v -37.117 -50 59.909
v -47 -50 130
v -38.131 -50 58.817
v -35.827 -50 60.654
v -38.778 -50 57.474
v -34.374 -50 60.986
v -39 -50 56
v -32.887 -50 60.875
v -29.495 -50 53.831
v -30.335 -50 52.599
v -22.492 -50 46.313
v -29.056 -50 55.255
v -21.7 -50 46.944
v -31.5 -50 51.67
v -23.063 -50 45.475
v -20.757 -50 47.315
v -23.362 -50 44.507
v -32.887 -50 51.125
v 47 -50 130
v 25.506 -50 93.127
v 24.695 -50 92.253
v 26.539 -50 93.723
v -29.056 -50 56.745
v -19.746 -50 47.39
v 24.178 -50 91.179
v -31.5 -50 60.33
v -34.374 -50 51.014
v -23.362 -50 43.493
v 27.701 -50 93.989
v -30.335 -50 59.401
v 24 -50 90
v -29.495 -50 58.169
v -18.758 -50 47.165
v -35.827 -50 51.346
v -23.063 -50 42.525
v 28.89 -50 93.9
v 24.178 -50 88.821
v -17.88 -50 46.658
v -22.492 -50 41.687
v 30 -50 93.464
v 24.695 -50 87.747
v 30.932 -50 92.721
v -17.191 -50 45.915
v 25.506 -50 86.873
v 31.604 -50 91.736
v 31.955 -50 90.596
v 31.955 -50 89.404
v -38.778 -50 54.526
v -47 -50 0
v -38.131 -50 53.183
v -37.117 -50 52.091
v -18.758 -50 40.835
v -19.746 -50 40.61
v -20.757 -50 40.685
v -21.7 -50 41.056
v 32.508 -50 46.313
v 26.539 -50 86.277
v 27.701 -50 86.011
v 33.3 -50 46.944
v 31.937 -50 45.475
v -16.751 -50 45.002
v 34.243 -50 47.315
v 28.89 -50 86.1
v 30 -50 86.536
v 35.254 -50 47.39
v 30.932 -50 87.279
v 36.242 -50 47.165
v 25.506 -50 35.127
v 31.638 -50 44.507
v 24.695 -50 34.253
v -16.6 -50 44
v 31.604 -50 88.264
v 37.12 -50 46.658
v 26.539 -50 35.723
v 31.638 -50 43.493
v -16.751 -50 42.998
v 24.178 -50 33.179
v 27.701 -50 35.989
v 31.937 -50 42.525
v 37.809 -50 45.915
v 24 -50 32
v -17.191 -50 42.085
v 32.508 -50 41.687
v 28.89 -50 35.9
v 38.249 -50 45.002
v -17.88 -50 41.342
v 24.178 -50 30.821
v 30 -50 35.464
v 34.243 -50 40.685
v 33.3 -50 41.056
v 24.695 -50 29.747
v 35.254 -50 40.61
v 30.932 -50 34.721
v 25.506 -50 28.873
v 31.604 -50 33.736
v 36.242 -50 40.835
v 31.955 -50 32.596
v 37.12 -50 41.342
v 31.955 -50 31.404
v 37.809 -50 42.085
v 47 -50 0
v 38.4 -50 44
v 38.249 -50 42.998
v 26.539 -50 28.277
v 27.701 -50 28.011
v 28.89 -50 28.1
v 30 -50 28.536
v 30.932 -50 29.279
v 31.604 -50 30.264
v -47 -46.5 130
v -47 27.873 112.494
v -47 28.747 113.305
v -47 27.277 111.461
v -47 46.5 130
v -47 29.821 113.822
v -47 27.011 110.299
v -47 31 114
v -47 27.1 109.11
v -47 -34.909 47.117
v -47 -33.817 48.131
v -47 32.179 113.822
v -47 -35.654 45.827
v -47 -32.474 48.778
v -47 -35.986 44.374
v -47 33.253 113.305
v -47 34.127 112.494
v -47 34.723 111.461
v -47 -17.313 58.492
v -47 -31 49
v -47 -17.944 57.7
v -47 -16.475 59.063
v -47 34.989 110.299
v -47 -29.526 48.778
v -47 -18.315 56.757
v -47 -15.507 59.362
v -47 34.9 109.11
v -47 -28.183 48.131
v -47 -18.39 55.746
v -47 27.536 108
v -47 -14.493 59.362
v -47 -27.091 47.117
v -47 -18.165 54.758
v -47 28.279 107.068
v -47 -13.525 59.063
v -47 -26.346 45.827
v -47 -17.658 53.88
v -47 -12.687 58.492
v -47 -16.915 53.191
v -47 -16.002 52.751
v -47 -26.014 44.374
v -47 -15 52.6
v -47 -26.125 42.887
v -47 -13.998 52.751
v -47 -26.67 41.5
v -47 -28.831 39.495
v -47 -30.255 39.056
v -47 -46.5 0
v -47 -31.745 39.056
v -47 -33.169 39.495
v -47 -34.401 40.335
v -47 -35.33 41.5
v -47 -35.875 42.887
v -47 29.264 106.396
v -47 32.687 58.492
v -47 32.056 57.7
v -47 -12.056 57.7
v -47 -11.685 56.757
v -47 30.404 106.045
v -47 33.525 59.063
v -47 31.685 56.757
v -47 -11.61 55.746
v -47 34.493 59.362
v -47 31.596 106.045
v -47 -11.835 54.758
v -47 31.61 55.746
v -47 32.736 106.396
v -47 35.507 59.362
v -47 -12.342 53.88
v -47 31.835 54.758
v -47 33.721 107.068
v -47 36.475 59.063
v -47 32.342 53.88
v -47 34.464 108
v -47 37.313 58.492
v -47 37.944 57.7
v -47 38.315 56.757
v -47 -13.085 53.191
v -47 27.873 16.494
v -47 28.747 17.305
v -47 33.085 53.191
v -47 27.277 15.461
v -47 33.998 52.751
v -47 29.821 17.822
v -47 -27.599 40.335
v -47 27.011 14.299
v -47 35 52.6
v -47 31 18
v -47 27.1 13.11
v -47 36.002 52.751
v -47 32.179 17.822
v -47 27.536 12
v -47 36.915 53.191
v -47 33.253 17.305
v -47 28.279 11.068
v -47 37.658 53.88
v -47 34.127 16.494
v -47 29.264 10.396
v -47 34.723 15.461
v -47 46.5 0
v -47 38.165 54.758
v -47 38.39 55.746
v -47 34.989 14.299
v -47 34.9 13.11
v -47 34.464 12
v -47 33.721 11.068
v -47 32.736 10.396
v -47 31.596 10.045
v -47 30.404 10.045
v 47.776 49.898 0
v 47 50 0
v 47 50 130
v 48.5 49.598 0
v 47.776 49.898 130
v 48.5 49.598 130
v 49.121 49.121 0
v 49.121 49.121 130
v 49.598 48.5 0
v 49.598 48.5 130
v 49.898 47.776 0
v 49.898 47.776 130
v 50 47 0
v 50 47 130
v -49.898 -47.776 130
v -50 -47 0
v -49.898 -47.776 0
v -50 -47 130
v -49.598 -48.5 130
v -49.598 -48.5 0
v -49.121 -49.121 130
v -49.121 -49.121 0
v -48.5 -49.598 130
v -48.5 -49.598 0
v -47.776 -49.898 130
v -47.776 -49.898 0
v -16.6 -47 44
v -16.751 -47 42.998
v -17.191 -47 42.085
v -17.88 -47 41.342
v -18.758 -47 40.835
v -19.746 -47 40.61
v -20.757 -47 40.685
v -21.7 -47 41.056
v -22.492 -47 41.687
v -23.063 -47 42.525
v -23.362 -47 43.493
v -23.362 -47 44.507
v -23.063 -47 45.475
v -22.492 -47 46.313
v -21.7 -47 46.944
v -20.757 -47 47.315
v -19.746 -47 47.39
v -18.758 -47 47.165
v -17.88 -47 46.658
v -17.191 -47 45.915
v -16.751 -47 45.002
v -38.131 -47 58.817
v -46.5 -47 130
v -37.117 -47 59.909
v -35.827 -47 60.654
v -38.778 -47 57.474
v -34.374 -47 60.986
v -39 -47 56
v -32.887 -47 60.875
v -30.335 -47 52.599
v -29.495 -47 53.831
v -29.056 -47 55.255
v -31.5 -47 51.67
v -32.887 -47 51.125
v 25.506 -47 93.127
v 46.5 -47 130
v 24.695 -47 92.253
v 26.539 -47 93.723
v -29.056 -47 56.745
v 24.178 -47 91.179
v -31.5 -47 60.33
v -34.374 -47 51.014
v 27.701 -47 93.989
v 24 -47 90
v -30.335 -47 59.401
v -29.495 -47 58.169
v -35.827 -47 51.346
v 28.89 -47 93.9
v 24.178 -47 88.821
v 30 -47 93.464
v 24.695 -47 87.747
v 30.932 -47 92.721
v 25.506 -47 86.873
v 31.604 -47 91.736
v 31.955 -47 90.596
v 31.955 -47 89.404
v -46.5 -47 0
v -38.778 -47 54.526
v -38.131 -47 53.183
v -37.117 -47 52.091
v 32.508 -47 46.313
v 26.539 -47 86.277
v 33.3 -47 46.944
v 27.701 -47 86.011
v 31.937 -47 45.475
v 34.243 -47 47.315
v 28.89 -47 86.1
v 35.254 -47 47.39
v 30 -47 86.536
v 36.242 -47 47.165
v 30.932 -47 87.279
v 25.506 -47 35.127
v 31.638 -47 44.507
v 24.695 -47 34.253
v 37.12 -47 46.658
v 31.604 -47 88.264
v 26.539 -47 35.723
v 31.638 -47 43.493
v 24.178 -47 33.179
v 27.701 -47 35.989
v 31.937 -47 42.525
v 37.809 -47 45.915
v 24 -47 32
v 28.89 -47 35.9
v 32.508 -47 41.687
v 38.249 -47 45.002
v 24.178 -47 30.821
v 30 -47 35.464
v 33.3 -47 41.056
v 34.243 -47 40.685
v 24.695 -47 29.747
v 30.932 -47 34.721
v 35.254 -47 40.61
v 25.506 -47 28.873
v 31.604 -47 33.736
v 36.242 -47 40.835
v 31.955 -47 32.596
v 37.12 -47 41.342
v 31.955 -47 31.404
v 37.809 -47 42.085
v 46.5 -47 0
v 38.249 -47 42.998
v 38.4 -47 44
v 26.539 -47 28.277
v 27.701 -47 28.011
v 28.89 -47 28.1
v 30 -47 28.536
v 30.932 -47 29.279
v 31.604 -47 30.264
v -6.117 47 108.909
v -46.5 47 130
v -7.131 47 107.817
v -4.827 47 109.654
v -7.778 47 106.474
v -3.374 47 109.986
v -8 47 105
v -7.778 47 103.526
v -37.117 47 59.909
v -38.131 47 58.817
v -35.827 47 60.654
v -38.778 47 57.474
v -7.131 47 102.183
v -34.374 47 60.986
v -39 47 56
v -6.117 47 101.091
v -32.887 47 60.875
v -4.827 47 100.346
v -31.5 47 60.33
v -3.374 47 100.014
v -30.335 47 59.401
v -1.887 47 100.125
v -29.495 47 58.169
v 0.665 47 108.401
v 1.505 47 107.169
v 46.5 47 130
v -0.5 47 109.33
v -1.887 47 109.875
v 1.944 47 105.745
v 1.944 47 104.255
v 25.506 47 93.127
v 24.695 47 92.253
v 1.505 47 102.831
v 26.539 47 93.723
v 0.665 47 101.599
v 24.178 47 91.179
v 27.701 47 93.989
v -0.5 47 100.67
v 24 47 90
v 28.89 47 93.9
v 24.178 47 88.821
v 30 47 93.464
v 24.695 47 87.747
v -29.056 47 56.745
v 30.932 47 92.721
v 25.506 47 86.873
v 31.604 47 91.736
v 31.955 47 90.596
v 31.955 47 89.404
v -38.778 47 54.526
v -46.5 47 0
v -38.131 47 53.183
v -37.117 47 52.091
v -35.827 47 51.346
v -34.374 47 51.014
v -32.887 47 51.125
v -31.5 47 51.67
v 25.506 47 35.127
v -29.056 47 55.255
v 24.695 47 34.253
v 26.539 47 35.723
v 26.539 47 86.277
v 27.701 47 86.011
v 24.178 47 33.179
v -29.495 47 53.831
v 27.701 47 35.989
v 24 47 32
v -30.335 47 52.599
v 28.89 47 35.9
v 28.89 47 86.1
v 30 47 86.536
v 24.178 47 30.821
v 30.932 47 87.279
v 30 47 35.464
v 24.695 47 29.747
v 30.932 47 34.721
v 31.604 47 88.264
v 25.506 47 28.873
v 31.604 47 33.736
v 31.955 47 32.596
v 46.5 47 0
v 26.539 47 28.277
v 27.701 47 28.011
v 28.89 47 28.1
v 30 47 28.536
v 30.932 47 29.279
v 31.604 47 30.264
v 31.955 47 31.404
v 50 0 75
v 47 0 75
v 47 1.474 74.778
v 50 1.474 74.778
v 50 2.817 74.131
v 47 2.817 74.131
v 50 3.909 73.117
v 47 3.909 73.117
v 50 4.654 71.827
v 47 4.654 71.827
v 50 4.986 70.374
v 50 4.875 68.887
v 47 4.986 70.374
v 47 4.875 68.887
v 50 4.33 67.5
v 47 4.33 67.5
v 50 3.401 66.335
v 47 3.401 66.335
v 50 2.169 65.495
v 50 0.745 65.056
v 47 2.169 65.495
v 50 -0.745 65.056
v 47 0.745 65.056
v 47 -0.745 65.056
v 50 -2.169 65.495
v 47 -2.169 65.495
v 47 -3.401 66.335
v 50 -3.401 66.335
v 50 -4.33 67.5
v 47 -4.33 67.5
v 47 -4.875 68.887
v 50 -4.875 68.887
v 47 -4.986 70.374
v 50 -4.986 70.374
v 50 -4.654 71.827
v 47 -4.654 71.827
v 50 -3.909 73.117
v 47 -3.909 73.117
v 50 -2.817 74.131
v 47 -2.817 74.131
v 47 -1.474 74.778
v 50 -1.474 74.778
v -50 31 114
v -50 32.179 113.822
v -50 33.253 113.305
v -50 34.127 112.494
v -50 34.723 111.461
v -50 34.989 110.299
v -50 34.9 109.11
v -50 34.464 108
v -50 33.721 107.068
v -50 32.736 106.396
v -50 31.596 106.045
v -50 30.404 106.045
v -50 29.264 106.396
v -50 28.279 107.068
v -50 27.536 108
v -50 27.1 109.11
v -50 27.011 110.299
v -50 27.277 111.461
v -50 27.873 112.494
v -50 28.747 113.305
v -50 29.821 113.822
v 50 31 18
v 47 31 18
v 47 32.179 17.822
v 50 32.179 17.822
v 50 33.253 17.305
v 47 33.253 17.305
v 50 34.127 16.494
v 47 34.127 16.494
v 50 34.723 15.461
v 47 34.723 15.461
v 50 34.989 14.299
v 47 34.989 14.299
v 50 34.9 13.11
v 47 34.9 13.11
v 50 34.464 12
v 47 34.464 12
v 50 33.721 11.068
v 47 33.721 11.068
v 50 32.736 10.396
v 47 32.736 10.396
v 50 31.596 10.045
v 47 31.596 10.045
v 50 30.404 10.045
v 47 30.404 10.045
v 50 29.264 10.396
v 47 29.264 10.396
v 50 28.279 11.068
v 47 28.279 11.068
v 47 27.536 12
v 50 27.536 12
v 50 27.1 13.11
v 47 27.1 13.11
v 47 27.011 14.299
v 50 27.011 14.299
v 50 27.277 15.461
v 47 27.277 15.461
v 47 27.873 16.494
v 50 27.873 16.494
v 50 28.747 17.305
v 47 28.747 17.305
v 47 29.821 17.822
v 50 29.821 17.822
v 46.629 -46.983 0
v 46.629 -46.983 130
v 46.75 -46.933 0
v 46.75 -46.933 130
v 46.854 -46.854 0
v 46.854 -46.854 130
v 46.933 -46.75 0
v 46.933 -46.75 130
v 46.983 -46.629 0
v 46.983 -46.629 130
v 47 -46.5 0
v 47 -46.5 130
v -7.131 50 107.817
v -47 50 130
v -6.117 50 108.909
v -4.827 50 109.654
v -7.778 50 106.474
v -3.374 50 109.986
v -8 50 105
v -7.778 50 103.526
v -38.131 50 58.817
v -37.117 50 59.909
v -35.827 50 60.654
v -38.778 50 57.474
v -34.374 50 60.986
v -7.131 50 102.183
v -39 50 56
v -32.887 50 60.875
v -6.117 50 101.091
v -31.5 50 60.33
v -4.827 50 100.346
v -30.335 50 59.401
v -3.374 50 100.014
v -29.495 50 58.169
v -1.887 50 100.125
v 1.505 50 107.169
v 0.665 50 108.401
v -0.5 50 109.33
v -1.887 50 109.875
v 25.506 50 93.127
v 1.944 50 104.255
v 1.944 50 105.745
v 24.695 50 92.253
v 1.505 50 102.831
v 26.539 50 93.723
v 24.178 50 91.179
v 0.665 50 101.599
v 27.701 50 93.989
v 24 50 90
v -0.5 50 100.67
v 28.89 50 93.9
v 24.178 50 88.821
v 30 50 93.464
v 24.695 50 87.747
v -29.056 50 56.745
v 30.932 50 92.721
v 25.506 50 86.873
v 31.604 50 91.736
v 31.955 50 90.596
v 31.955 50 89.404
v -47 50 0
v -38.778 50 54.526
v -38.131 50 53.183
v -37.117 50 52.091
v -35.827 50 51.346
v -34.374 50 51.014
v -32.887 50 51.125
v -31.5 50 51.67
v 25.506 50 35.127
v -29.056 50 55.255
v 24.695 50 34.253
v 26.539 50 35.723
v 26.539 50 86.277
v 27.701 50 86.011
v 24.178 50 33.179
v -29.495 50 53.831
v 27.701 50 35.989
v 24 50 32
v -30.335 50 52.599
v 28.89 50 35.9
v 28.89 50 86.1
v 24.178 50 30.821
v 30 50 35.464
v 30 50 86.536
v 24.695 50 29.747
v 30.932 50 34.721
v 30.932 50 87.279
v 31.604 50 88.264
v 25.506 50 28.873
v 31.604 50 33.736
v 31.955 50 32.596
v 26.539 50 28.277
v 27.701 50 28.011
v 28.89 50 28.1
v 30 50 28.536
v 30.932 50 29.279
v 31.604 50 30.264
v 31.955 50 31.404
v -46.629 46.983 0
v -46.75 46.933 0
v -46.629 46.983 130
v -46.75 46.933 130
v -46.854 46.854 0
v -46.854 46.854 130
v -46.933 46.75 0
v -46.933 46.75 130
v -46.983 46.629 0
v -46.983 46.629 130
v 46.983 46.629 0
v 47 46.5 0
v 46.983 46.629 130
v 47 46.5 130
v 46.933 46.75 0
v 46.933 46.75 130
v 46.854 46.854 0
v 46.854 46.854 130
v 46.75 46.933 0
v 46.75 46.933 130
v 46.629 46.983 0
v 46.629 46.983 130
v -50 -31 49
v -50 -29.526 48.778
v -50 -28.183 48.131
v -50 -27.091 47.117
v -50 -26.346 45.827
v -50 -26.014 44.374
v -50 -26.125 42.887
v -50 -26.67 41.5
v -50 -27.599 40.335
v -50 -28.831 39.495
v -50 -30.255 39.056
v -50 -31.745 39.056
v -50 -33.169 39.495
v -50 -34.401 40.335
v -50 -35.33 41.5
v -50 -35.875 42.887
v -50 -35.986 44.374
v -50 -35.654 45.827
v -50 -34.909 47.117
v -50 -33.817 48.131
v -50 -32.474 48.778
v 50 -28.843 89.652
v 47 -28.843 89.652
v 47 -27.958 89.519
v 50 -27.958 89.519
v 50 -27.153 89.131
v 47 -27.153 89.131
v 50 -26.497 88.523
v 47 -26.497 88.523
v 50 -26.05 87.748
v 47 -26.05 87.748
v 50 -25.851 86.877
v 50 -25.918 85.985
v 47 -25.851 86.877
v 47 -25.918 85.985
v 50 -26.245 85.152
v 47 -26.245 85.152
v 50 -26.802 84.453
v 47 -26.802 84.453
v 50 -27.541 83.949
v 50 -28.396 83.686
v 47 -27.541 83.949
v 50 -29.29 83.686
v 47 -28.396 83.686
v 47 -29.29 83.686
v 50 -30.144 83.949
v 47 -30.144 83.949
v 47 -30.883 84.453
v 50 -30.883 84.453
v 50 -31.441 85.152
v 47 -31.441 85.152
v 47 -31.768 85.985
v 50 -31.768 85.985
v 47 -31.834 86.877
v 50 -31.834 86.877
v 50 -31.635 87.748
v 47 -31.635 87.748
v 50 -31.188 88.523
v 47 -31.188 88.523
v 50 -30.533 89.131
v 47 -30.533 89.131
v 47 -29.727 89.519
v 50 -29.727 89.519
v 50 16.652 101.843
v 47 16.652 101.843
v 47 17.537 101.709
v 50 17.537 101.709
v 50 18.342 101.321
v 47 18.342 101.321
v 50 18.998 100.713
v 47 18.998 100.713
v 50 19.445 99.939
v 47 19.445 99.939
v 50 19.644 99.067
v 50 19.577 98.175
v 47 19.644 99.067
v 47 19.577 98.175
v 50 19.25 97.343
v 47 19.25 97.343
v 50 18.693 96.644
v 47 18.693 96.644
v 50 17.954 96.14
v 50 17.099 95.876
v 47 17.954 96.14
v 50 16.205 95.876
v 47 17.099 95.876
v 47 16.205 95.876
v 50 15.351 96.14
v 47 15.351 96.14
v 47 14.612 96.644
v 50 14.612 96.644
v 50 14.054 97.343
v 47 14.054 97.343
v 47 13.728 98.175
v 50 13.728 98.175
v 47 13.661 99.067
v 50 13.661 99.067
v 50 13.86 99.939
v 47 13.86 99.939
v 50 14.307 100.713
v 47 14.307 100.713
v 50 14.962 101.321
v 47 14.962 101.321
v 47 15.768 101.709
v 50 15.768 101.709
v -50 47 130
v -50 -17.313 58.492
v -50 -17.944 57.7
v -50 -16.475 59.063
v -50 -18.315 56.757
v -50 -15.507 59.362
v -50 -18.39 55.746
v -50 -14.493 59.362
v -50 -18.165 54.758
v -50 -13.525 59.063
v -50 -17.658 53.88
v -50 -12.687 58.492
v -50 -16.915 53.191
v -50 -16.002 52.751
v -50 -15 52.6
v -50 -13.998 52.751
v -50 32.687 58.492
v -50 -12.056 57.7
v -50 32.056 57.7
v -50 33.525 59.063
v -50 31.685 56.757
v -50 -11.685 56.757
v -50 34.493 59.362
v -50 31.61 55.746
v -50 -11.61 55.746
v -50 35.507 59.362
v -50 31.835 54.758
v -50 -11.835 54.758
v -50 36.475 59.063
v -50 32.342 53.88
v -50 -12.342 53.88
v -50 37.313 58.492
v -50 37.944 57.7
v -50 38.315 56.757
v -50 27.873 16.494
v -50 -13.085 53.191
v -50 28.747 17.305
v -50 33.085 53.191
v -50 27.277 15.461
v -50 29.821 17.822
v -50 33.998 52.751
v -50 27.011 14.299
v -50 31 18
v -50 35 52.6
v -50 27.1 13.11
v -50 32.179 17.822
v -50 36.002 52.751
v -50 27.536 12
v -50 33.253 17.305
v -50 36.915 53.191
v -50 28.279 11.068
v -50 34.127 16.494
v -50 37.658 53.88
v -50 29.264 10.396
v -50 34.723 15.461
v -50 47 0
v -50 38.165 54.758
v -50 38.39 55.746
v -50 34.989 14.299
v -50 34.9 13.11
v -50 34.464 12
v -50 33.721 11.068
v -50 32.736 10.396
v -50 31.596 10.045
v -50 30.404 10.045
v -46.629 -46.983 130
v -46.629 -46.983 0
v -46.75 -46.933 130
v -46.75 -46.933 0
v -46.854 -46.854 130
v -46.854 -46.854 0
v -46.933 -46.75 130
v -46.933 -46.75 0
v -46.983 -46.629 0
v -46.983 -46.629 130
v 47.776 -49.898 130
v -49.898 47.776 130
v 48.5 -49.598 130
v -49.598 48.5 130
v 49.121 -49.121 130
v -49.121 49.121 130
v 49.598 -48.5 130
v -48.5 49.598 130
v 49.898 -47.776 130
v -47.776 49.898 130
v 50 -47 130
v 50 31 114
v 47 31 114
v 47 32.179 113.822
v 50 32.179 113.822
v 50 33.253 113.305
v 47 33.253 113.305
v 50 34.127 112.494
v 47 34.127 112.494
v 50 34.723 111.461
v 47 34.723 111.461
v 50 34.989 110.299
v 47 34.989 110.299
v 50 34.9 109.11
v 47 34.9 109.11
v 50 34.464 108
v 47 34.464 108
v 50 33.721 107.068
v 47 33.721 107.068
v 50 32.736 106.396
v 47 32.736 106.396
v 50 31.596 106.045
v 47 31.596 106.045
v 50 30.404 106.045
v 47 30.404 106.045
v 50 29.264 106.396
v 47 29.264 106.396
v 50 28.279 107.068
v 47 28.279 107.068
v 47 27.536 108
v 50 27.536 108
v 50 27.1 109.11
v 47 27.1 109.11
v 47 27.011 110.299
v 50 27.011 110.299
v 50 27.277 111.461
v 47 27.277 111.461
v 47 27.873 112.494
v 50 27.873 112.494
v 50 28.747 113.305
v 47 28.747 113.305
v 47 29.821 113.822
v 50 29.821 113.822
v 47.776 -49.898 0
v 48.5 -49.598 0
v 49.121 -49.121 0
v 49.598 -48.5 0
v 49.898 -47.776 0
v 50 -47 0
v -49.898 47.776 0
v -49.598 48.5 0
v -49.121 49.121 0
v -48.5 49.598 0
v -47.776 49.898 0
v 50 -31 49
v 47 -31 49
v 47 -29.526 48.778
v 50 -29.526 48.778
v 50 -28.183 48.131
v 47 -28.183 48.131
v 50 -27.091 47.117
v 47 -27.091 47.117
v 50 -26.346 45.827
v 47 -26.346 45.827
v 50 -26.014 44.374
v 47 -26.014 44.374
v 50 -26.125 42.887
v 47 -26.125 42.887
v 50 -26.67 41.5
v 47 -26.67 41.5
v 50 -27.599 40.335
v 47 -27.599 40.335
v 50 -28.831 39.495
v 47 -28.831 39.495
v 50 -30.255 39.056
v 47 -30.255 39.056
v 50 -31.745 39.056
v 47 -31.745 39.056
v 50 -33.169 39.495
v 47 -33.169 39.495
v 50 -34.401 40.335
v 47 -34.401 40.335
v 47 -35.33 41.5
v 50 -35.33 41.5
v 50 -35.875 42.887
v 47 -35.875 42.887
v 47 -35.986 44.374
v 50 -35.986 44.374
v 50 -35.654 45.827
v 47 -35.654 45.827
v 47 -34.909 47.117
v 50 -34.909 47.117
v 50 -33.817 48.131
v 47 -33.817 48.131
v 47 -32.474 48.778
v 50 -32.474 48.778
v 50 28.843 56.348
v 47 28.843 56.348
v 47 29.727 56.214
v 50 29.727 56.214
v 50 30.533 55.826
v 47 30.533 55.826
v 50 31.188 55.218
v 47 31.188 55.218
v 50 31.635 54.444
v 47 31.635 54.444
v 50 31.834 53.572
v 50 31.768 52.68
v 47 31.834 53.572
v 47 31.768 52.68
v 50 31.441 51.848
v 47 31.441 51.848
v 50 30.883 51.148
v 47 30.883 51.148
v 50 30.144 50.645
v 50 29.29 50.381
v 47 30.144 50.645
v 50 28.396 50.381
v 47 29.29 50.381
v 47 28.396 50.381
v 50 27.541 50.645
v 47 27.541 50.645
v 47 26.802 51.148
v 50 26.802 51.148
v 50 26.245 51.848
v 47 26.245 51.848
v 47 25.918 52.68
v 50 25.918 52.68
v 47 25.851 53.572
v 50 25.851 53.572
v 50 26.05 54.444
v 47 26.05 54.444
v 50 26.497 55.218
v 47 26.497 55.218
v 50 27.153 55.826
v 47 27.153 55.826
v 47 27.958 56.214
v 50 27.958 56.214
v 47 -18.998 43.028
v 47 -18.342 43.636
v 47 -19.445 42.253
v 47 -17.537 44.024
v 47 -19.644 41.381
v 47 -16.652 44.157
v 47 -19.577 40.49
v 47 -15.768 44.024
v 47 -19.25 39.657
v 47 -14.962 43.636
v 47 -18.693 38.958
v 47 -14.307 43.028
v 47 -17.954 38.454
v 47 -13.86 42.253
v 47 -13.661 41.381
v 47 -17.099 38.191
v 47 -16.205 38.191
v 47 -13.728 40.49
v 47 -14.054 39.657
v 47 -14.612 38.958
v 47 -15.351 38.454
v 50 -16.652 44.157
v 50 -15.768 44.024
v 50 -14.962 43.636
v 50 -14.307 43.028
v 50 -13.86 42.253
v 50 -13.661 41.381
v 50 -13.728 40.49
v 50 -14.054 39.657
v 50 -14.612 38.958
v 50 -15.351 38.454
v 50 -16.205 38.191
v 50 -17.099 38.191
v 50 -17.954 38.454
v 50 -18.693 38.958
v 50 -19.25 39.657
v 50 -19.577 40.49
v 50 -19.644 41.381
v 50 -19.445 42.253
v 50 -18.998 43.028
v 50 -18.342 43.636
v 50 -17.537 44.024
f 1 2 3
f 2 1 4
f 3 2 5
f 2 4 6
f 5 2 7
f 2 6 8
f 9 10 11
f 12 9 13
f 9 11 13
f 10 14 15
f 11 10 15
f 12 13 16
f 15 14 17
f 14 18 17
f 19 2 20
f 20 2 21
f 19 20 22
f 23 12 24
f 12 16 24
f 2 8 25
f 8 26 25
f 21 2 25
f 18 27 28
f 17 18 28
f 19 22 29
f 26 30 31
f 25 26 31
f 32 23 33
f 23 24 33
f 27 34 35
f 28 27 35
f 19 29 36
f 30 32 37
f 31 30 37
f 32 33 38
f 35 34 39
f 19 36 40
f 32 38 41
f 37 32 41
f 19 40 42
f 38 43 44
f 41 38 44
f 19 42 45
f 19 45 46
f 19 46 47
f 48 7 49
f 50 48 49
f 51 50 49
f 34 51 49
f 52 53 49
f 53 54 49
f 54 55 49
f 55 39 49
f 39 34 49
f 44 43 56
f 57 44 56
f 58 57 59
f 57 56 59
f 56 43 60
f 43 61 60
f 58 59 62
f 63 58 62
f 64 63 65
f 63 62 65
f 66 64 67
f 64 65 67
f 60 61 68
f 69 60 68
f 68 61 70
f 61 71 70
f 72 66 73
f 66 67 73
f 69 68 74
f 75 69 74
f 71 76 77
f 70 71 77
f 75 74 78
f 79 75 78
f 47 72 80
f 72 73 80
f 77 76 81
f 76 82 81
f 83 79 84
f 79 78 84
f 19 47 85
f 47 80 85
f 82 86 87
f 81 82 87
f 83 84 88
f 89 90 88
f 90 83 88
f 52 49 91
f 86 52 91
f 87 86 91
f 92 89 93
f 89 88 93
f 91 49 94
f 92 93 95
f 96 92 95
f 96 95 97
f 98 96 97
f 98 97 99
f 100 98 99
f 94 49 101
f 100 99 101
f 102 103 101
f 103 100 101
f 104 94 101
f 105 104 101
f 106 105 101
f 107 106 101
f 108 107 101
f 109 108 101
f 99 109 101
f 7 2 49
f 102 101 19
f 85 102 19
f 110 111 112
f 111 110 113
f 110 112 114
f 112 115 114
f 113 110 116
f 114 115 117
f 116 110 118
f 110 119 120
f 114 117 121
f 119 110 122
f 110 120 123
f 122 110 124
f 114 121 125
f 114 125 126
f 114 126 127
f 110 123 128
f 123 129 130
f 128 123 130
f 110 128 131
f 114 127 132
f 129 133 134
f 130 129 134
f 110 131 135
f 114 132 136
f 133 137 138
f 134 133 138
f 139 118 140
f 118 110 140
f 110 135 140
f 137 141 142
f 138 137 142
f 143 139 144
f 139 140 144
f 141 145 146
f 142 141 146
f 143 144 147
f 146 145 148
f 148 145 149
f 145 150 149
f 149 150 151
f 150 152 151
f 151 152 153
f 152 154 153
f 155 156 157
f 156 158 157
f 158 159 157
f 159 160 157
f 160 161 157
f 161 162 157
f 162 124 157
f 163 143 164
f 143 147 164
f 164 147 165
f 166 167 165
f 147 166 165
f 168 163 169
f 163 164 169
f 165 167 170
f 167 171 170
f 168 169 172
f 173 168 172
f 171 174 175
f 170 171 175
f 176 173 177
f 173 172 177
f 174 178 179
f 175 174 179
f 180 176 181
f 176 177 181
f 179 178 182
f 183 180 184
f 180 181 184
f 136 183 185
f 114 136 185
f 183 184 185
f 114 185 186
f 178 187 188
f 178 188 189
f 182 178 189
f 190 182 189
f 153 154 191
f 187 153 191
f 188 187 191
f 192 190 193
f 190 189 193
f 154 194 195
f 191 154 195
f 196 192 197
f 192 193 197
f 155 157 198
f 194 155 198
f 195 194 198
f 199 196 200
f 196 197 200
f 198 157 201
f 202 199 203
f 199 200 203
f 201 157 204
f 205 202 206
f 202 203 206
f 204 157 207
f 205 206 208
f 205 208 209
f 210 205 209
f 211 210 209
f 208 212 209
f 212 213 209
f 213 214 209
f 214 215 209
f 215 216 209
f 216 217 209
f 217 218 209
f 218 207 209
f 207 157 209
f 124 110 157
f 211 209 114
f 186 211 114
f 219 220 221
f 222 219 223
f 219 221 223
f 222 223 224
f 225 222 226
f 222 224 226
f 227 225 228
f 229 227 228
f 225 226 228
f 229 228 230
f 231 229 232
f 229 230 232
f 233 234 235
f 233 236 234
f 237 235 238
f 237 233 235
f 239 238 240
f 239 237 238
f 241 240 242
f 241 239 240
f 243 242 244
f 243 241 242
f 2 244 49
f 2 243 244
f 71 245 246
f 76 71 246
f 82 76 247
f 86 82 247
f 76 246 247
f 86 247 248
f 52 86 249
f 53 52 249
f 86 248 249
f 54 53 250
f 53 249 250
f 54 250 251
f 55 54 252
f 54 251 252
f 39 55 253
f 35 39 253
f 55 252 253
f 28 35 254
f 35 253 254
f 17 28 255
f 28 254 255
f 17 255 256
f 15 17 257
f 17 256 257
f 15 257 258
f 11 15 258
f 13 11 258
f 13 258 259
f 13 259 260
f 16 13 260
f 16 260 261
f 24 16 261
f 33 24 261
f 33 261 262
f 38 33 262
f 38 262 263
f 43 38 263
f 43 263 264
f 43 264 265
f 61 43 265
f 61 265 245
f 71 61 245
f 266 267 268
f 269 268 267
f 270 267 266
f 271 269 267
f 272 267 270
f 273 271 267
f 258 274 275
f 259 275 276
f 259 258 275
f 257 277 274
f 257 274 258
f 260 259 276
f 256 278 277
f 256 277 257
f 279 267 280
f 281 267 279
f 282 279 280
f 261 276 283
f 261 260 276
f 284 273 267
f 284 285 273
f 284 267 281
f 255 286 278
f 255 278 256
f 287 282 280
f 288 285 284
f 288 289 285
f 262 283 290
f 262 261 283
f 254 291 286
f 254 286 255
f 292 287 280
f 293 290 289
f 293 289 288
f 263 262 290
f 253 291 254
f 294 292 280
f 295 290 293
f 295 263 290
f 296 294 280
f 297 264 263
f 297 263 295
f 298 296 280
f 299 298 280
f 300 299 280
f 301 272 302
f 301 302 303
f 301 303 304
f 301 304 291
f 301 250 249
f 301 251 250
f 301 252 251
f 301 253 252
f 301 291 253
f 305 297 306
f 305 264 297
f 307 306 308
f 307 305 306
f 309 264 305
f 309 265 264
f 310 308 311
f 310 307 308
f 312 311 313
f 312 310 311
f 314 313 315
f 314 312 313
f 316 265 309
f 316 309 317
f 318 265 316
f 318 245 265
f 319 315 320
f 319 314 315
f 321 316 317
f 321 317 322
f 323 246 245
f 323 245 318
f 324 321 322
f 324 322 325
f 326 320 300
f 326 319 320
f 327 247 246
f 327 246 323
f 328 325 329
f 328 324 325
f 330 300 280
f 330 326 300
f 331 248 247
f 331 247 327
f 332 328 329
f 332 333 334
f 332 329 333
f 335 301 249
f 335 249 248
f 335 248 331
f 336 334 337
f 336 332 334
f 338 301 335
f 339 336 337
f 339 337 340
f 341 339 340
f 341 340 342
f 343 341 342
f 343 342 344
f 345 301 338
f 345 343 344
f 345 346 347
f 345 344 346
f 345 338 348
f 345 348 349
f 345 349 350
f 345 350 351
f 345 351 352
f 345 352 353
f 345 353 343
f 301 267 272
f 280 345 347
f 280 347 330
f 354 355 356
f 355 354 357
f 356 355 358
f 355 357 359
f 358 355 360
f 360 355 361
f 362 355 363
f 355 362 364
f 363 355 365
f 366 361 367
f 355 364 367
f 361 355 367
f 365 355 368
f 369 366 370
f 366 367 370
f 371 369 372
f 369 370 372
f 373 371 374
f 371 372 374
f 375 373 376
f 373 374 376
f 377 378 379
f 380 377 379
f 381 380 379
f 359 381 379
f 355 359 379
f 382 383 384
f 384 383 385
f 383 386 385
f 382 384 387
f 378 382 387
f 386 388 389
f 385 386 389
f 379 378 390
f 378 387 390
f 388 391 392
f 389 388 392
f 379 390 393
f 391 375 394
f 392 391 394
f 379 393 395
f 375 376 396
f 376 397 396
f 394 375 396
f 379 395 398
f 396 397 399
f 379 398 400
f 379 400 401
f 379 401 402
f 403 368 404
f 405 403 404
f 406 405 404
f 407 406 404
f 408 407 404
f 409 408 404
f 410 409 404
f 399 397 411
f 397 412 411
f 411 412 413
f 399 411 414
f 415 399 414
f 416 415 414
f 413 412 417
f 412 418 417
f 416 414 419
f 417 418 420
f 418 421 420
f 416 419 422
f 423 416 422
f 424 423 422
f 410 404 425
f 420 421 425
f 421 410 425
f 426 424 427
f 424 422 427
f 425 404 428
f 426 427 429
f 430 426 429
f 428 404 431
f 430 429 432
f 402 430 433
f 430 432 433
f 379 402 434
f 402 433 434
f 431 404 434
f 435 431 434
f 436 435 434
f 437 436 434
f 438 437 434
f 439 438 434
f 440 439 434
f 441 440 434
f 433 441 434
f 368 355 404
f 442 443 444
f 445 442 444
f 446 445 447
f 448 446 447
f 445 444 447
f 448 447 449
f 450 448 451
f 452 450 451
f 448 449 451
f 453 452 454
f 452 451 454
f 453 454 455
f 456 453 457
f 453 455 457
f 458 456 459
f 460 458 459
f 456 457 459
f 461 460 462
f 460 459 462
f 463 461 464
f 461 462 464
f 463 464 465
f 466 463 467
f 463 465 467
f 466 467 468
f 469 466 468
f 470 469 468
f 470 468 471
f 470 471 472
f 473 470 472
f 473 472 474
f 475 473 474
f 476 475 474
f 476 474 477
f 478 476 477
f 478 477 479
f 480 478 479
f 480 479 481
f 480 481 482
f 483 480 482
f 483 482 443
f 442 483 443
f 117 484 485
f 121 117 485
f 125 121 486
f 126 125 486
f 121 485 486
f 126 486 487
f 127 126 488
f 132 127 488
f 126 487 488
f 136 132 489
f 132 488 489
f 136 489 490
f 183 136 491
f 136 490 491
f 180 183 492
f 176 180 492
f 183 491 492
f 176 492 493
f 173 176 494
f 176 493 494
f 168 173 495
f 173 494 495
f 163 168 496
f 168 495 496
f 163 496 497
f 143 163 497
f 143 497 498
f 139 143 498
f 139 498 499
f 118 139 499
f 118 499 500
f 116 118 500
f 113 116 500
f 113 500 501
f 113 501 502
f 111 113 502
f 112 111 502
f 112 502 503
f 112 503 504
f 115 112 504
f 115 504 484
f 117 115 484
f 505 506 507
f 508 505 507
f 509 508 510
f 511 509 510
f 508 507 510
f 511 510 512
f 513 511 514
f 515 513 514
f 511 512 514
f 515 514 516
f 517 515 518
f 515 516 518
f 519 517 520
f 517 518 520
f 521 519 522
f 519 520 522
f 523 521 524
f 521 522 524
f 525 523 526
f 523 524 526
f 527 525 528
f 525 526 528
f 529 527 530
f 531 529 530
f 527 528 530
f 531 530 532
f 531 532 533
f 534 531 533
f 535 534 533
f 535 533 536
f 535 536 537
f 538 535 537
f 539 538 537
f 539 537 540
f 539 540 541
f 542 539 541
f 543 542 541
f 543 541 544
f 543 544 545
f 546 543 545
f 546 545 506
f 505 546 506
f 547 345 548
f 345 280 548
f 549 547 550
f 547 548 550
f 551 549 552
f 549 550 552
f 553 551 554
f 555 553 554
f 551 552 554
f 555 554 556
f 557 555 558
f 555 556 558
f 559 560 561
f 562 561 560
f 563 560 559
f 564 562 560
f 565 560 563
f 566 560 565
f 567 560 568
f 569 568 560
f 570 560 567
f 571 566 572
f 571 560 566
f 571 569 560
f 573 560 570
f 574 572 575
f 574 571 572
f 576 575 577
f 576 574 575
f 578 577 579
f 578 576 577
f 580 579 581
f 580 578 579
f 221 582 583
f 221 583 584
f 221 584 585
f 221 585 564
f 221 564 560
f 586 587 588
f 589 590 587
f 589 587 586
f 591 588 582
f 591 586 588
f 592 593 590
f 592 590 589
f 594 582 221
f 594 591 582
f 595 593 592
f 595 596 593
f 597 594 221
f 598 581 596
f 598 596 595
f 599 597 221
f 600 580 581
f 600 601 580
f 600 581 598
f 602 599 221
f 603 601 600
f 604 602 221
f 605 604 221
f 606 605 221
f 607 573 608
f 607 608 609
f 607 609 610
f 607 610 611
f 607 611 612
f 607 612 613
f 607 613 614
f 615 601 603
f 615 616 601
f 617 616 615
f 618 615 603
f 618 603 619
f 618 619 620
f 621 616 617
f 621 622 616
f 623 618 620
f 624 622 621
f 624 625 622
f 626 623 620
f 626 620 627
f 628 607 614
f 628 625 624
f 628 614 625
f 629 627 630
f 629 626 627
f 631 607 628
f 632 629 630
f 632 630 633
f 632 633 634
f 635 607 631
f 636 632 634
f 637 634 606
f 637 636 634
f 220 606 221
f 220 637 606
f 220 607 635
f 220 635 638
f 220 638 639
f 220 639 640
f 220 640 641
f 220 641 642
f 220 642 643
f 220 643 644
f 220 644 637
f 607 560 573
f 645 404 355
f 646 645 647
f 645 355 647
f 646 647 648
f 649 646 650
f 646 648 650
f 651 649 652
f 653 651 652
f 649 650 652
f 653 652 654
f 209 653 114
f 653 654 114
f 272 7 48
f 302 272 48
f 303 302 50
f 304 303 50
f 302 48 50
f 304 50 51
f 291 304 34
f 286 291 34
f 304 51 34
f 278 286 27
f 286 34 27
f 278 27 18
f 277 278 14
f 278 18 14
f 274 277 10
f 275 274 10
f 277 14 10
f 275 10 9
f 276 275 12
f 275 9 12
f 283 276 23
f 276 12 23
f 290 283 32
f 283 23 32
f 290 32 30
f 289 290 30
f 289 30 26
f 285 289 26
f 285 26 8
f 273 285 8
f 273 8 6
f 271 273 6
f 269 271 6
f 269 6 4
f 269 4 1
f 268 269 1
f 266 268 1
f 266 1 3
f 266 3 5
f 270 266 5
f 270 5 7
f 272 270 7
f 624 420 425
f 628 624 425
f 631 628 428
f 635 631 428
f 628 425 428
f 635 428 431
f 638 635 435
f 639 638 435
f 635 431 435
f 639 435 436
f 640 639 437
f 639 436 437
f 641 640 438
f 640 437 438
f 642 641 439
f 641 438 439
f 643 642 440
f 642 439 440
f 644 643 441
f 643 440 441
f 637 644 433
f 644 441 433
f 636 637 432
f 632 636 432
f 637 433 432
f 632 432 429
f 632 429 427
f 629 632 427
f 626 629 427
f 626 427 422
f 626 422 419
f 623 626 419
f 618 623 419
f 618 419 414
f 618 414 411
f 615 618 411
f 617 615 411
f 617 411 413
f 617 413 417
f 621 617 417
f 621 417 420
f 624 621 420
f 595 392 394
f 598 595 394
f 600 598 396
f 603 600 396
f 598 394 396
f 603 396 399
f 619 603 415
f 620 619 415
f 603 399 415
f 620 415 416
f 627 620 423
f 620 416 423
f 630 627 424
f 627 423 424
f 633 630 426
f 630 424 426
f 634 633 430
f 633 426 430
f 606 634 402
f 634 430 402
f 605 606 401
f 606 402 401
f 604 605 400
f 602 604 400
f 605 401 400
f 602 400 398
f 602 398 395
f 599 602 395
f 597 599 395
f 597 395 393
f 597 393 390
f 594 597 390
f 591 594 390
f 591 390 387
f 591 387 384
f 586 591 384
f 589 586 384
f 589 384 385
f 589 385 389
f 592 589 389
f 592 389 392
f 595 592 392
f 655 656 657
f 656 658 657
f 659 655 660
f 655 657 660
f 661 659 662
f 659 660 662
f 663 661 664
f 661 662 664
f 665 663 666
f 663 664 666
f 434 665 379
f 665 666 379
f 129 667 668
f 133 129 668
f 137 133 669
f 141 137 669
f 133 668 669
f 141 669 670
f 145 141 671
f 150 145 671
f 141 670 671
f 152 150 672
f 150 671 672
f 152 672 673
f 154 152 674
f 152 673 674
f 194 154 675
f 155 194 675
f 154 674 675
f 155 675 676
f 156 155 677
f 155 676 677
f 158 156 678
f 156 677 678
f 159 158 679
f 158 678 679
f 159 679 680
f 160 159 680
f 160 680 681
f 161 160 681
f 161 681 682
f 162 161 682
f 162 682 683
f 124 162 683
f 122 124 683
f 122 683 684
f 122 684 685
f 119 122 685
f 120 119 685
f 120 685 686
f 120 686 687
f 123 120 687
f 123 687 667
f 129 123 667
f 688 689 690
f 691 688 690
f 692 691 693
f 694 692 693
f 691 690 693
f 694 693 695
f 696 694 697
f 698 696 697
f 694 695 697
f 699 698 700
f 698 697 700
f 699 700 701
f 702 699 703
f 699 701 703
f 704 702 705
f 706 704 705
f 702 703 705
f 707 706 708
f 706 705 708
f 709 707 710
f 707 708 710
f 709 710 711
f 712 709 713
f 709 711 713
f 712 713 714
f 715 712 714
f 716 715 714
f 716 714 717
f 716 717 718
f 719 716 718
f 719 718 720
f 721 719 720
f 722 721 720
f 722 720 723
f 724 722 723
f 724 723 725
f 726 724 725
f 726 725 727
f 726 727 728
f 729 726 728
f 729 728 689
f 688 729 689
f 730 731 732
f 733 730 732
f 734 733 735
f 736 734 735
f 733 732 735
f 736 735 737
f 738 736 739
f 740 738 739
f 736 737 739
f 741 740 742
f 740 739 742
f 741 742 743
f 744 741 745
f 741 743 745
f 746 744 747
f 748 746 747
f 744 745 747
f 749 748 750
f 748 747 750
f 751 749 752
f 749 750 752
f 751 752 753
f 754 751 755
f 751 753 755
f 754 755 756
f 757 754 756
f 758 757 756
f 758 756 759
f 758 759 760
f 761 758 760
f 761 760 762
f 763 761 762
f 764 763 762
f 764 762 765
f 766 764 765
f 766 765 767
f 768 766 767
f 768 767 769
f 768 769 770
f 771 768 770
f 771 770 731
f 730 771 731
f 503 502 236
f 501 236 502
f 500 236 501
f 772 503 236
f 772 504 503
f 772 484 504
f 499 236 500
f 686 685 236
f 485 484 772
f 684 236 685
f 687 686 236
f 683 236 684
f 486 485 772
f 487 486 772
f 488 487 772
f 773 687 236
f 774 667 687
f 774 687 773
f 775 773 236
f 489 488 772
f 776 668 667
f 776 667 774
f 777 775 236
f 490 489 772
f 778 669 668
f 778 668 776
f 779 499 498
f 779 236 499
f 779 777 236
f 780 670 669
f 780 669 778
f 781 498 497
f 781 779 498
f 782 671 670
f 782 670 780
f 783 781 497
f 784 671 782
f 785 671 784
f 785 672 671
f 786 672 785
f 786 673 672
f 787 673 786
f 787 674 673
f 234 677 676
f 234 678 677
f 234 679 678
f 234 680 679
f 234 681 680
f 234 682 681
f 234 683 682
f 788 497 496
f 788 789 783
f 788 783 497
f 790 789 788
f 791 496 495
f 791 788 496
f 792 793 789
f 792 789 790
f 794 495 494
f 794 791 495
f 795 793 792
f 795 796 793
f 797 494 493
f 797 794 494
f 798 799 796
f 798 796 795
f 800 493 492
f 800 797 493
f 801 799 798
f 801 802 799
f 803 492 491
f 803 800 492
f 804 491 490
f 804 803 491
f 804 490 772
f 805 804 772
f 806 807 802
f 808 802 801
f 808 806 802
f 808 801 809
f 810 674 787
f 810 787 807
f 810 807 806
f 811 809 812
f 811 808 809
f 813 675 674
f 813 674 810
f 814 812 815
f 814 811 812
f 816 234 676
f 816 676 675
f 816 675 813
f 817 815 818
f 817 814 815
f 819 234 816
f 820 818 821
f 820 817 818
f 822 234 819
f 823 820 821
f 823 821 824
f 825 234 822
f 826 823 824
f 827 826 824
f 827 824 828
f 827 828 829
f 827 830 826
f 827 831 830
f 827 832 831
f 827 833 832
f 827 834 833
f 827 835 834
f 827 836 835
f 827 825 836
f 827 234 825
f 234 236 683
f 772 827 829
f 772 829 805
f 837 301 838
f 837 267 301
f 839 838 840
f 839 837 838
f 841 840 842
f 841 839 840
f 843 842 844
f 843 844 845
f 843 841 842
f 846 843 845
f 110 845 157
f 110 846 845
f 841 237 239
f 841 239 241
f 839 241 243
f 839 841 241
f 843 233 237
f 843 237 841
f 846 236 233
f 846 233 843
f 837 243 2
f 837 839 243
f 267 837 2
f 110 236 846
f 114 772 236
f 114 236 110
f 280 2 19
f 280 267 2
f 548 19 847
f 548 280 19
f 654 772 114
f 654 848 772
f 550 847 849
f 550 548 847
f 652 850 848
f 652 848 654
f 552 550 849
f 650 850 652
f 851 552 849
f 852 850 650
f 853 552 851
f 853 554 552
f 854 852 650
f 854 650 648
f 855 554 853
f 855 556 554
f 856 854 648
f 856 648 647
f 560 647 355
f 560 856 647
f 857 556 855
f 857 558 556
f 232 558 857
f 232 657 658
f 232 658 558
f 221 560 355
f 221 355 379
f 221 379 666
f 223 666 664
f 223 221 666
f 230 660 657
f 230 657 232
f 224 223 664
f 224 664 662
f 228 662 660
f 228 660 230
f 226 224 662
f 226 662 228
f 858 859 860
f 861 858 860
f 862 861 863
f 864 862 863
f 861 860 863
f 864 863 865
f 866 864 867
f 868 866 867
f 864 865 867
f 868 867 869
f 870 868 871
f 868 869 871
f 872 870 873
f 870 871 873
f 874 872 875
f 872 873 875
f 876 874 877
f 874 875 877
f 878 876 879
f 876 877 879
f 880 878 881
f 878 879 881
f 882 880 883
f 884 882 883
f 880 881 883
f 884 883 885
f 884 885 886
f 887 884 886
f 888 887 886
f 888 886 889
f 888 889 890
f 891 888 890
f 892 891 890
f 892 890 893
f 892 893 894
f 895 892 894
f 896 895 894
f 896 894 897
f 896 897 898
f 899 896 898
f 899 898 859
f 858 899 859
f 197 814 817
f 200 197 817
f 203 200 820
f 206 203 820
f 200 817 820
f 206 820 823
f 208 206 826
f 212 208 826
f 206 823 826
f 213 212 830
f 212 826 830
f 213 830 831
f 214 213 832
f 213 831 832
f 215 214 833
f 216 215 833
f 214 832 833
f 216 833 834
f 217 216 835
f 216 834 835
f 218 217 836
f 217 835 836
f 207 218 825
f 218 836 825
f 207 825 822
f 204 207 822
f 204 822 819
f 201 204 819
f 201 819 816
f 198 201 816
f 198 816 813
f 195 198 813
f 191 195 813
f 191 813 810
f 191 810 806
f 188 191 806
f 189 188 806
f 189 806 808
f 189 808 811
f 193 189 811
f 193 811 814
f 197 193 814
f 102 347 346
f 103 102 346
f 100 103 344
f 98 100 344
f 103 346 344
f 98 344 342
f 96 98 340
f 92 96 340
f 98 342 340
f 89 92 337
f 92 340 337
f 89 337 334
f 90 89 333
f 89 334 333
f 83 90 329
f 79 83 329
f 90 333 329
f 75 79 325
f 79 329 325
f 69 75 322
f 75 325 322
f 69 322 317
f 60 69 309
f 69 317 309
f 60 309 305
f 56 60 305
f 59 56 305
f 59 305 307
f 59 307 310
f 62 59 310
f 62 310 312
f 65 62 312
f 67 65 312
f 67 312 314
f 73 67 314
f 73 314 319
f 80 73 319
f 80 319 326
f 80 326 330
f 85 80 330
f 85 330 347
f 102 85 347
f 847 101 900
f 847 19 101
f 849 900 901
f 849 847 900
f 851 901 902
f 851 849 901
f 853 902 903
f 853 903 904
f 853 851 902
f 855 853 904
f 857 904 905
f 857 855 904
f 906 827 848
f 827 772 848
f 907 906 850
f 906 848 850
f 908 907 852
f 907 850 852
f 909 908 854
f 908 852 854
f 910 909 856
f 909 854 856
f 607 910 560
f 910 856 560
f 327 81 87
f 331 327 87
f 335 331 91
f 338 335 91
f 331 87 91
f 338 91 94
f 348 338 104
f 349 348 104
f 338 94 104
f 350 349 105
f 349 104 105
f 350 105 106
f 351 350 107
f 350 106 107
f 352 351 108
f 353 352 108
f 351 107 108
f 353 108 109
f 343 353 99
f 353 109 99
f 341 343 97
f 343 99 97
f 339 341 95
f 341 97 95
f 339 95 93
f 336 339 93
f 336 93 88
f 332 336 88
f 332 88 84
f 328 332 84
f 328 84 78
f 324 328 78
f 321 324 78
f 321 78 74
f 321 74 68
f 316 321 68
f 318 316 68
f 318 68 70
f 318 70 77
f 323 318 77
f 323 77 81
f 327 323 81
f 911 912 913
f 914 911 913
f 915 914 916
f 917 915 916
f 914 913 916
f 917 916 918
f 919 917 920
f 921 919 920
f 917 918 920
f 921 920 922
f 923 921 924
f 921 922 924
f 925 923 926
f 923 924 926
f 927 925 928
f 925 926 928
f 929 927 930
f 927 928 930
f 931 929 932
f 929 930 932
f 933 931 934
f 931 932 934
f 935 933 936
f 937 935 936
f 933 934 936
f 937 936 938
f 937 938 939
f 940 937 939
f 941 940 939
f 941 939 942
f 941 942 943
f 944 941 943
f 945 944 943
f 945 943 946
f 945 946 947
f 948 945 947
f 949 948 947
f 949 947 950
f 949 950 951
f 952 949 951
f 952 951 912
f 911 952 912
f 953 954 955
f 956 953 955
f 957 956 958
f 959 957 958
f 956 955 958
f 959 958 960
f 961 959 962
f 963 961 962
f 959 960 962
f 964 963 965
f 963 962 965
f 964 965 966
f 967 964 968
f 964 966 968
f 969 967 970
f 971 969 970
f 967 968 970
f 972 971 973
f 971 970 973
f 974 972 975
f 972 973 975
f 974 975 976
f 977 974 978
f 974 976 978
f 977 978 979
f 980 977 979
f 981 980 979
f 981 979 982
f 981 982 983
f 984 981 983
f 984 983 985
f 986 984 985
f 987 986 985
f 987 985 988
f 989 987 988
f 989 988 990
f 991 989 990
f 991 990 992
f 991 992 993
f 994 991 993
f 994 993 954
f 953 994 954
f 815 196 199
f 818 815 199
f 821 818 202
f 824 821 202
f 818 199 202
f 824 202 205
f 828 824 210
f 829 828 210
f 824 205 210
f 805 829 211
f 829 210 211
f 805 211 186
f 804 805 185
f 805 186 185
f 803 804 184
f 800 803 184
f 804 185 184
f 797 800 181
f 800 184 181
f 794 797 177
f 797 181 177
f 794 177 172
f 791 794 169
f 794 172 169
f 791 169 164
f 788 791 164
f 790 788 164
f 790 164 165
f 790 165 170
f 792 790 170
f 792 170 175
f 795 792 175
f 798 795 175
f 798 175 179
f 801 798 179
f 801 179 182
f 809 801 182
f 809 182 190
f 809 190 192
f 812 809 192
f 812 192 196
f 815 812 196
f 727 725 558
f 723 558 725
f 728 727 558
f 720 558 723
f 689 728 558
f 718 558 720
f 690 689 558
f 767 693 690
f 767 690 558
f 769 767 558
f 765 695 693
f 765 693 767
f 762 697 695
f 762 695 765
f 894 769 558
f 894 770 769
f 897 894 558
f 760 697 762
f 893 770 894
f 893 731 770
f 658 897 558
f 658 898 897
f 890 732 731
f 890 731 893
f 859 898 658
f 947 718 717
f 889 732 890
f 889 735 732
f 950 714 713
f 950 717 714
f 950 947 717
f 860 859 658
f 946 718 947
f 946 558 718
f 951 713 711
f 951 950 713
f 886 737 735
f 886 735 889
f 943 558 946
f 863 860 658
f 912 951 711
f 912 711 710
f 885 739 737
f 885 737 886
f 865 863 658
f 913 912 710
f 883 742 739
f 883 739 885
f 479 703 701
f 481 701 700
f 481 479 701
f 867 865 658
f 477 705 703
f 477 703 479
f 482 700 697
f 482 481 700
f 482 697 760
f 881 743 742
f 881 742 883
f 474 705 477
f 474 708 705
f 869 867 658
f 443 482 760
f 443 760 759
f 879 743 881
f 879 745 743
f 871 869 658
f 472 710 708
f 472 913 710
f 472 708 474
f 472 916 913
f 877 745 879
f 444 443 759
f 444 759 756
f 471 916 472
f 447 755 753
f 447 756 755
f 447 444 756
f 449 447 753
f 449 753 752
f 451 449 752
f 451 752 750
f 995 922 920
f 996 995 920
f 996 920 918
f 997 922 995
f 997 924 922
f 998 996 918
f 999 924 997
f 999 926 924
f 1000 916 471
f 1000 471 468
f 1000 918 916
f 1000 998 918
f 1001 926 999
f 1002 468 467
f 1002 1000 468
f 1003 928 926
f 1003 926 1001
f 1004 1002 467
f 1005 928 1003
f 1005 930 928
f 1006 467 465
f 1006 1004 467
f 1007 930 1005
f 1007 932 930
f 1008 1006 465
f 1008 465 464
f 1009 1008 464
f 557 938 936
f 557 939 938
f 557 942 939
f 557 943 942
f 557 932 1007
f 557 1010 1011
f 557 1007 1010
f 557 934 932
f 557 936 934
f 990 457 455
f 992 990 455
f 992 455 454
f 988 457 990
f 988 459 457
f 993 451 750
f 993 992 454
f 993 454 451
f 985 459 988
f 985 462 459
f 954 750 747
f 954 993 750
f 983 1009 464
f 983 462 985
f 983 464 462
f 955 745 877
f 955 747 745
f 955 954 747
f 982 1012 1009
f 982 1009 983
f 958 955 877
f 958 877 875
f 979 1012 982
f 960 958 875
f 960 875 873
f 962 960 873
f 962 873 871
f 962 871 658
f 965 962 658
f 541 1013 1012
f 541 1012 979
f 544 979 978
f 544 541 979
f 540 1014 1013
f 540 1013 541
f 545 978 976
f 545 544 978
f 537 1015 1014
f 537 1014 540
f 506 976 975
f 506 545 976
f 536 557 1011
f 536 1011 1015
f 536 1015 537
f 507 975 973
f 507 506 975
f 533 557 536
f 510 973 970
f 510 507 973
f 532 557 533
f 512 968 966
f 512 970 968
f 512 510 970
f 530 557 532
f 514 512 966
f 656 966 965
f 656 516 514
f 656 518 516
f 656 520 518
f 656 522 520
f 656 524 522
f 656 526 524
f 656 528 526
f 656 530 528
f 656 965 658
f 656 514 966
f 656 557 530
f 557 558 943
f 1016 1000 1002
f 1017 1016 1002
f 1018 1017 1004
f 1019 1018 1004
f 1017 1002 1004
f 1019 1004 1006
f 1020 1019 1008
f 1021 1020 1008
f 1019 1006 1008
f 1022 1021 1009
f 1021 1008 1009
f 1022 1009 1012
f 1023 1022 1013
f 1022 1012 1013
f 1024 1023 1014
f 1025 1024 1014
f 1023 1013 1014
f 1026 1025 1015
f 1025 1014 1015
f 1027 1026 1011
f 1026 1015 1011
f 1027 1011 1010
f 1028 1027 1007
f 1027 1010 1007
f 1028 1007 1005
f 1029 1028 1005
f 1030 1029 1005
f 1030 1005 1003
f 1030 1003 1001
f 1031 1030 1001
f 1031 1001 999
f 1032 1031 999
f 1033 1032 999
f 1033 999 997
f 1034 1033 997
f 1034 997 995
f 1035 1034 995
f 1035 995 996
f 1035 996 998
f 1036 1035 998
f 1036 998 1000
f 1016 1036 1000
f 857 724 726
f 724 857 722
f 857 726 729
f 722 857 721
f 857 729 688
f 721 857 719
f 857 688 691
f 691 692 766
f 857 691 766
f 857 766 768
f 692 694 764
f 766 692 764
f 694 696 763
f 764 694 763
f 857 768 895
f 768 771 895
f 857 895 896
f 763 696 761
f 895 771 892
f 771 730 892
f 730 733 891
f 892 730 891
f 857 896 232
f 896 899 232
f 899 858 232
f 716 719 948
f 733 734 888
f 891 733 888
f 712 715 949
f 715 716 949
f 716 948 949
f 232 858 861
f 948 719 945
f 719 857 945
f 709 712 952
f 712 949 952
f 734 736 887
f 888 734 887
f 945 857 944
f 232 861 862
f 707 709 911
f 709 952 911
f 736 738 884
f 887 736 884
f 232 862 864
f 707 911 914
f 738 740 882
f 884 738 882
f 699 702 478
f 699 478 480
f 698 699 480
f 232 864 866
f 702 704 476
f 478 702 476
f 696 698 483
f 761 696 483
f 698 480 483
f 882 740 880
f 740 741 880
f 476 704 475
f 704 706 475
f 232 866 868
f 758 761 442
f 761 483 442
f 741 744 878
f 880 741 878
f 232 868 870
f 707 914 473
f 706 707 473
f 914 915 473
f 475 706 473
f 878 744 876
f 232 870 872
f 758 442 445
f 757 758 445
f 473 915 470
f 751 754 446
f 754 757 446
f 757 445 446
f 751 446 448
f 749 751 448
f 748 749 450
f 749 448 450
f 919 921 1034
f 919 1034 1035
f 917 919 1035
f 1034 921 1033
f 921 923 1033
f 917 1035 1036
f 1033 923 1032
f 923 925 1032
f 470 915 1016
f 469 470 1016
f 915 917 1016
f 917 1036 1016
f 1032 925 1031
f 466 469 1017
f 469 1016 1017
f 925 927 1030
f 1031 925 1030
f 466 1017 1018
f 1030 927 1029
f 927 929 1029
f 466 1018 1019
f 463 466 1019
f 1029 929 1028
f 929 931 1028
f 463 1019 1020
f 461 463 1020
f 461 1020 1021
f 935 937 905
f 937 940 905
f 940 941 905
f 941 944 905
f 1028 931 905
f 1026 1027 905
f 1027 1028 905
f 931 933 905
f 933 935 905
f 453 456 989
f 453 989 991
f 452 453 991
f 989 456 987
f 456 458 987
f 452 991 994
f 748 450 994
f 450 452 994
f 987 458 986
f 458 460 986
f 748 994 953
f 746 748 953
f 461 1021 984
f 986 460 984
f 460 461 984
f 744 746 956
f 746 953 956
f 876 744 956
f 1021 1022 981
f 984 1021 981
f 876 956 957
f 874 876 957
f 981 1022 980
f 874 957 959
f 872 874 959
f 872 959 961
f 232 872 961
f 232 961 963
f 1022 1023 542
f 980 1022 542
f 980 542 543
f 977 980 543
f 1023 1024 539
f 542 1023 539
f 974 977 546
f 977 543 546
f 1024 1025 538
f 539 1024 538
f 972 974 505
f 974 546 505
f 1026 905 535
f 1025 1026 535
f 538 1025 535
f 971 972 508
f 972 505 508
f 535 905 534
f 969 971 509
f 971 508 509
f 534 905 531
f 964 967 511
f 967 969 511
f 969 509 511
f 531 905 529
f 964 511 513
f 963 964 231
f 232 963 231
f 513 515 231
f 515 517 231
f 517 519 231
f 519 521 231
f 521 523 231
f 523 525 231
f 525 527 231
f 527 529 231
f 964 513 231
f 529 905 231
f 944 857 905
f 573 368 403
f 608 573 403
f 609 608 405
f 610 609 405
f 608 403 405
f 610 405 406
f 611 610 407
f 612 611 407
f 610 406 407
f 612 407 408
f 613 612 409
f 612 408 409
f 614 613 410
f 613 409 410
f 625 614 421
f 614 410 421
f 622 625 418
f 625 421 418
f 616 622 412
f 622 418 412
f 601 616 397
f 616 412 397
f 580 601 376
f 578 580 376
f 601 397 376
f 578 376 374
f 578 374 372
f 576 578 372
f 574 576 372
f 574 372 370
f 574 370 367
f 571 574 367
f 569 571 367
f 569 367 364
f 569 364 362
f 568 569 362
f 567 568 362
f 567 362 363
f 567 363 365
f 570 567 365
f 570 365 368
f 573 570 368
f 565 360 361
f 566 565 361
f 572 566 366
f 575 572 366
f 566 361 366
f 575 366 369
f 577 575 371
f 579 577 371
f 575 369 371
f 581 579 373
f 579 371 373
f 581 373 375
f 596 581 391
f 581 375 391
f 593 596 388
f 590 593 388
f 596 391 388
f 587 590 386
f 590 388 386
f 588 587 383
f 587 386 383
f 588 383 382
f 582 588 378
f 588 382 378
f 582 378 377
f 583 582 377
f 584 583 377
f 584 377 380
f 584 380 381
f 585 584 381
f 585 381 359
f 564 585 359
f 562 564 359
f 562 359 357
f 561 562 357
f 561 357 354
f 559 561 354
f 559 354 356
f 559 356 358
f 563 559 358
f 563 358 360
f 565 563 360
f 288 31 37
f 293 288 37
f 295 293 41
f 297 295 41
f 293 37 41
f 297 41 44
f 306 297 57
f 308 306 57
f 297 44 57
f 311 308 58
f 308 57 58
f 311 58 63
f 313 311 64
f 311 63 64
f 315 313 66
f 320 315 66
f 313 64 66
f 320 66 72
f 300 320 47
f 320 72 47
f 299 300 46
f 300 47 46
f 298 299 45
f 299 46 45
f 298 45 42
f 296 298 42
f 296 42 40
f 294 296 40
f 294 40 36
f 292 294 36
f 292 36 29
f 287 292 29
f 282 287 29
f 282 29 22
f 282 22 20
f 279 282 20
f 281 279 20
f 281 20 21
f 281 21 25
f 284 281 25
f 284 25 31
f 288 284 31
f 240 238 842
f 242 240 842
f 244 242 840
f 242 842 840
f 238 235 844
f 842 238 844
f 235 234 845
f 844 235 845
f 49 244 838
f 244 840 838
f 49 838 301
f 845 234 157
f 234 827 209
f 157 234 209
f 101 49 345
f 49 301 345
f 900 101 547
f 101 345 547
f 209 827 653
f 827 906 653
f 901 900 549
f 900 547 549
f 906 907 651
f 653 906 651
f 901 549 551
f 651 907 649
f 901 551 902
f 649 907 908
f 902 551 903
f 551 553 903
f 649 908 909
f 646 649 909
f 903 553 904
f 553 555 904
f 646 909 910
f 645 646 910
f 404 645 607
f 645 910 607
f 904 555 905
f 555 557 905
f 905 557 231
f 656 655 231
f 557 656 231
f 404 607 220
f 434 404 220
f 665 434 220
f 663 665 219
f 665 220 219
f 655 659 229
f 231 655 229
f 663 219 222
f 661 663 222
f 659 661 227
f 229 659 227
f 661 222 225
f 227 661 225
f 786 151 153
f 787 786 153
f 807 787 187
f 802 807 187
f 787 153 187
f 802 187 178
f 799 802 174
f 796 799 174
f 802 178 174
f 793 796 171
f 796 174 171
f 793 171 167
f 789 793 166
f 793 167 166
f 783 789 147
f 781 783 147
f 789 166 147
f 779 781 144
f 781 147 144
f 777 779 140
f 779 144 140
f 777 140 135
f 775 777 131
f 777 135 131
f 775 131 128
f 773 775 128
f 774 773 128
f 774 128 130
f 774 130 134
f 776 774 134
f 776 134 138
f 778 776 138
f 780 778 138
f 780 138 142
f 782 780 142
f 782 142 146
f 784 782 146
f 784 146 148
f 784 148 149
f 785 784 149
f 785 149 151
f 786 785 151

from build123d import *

# Parameters (mm, degrees)
SKETCH1_W                      = 100
SKETCH1_H                      = 100
SKETCH1_W_2                    = 94
SKETCH1_H_2                    = 94
EXTRUDE_THIN1_DEPTH            = 130
FILLET1_R                      = 0.5
FILLET2_R                      = 3
F_8_0_8_DIAMETER_HOLE2_D       = 8
F_8_0_8_DIAMETER_HOLE3_D       = 8
F_10_0_10_DIAMETER_HOLE1_D     = 10
F_10_0_10_DIAMETER_HOLE2_D     = 10
M8X1_25_TAPPED_HOLE1_D         = 6.8
M8X1_25_TAPPED_HOLE1_DEPTH     = 3
M8X1_25_TAPPED_HOLE2_D         = 6.8
M8X1_25_TAPPED_HOLE2_DEPTH     = 3
F_10_0_10_DIAMETER_HOLE3_D     = 10
F_10_0_10_DIAMETER_HOLE3_DEPTH = 3
F_6_0_6_DIAMETER_HOLE1_D       = 6
F_6_0_6_DIAMETER_HOLE1_DEPTH   = 3
F_10_0_10_DIAMETER_HOLE4_D     = 10
F_10_0_10_DIAMETER_HOLE4_DEPTH = 3


with BuildPart() as part:
    # Sketch1 → Extrude-Thin1 (new body)
    with BuildSketch(Plane.XY):
        Rectangle(SKETCH1_W, SKETCH1_H)
        Rectangle(SKETCH1_W_2, SKETCH1_H_2, mode=Mode.SUBTRACT)
    extrude(amount=EXTRUDE_THIN1_DEPTH)

    # Fillet1
    fillet1_edges = [part.edges().sort_by_distance(p)[0] for p in [
        (47, -47, 65),
        (47, 47, 65),
        (-47, 47, 65),
        (-47, -47, 65),
    ]]
    fillet(fillet1_edges, radius=FILLET1_R)

    # Fillet2
    fillet2_edges = [part.edges().sort_by_distance(p)[0] for p in [
        (50, -50, 65),
        (-50, -50, 65),
        (-50, 50, 65),
        (50, 50, 65),
    ]]
    fillet(fillet2_edges, radius=FILLET2_R)

    # Ø8.0 (8) Diameter Hole2 (through all)
    with Locations(Plane(origin=(0, 50, 0), x_dir=(1, 0, 0), z_dir=(0, 1, 0))):
        with Locations((28, -32), (28, -90)):
            Hole(F_8_0_8_DIAMETER_HOLE2_D / 2)

    # Ø8.0 (8) Diameter Hole3 (through all)
    with Locations(Plane(origin=(50, 0, 0), x_dir=(0, 0, -1), z_dir=(1, 0, 0))):
        with Locations((-14, 31), (-110, 31)):
            Hole(F_8_0_8_DIAMETER_HOLE3_D / 2)

    # Ø10.0 (10) Diameter Hole1 (through all)
    with Locations(Plane(origin=(0, 50, 0), x_dir=(1, 0, 0), z_dir=(0, 1, 0))):
        with Locations((-34, -56)):
            Hole(F_10_0_10_DIAMETER_HOLE1_D / 2)

    # Ø10.0 (10) Diameter Hole2 (through all)
    with Locations(Plane(origin=(50, 0, 0), x_dir=(0, 0, -1), z_dir=(1, 0, 0))):
        with Locations((-44, -31)):
            Hole(F_10_0_10_DIAMETER_HOLE2_D / 2)

    # M8x1.25 Tapped Hole1
    with Locations(Plane.ZY.offset(50)):
        with Locations((56, -15), (56, 35)):
            Hole(M8X1_25_TAPPED_HOLE1_D / 2, depth=M8X1_25_TAPPED_HOLE1_DEPTH)

    # M8x1.25 Tapped Hole2
    with Locations(Plane(origin=(0, -50, 0), x_dir=(-1, 0, 0), z_dir=(0, -1, 0))):
        with Locations((20, -44), (-35, -44)):
            Hole(M8X1_25_TAPPED_HOLE2_D / 2, depth=M8X1_25_TAPPED_HOLE2_DEPTH)

    # Ø10.0 (10) Diameter Hole3
    with Locations(Plane(origin=(50, 0, 0), x_dir=(0, 0, -1), z_dir=(1, 0, 0))):
        with Locations((-70, 0)):
            Hole(F_10_0_10_DIAMETER_HOLE3_D / 2, depth=F_10_0_10_DIAMETER_HOLE3_DEPTH)

    # Ø6.0 (6) Diameter Hole1
    with Locations(Plane(origin=(50, 0, 0), x_dir=(0, 0, -1), z_dir=(1, 0, 0))):
        with Locations((-41.157258279, -16.652364697), (-53.347635303, 28.842741721), (-98.842741721, 16.652364697), (-86.652364697, -28.842741721)):
            Hole(F_6_0_6_DIAMETER_HOLE1_D / 2, depth=F_6_0_6_DIAMETER_HOLE1_DEPTH)

    # Ø10.0 (10) Diameter Hole4
    with Locations(Plane(origin=(0, 50, 0), x_dir=(1, 0, 0), z_dir=(0, 1, 0))):
        with Locations((-3, -105)):
            Hole(F_10_0_10_DIAMETER_HOLE4_D / 2, depth=F_10_0_10_DIAMETER_HOLE4_DEPTH)


solid = part.part
